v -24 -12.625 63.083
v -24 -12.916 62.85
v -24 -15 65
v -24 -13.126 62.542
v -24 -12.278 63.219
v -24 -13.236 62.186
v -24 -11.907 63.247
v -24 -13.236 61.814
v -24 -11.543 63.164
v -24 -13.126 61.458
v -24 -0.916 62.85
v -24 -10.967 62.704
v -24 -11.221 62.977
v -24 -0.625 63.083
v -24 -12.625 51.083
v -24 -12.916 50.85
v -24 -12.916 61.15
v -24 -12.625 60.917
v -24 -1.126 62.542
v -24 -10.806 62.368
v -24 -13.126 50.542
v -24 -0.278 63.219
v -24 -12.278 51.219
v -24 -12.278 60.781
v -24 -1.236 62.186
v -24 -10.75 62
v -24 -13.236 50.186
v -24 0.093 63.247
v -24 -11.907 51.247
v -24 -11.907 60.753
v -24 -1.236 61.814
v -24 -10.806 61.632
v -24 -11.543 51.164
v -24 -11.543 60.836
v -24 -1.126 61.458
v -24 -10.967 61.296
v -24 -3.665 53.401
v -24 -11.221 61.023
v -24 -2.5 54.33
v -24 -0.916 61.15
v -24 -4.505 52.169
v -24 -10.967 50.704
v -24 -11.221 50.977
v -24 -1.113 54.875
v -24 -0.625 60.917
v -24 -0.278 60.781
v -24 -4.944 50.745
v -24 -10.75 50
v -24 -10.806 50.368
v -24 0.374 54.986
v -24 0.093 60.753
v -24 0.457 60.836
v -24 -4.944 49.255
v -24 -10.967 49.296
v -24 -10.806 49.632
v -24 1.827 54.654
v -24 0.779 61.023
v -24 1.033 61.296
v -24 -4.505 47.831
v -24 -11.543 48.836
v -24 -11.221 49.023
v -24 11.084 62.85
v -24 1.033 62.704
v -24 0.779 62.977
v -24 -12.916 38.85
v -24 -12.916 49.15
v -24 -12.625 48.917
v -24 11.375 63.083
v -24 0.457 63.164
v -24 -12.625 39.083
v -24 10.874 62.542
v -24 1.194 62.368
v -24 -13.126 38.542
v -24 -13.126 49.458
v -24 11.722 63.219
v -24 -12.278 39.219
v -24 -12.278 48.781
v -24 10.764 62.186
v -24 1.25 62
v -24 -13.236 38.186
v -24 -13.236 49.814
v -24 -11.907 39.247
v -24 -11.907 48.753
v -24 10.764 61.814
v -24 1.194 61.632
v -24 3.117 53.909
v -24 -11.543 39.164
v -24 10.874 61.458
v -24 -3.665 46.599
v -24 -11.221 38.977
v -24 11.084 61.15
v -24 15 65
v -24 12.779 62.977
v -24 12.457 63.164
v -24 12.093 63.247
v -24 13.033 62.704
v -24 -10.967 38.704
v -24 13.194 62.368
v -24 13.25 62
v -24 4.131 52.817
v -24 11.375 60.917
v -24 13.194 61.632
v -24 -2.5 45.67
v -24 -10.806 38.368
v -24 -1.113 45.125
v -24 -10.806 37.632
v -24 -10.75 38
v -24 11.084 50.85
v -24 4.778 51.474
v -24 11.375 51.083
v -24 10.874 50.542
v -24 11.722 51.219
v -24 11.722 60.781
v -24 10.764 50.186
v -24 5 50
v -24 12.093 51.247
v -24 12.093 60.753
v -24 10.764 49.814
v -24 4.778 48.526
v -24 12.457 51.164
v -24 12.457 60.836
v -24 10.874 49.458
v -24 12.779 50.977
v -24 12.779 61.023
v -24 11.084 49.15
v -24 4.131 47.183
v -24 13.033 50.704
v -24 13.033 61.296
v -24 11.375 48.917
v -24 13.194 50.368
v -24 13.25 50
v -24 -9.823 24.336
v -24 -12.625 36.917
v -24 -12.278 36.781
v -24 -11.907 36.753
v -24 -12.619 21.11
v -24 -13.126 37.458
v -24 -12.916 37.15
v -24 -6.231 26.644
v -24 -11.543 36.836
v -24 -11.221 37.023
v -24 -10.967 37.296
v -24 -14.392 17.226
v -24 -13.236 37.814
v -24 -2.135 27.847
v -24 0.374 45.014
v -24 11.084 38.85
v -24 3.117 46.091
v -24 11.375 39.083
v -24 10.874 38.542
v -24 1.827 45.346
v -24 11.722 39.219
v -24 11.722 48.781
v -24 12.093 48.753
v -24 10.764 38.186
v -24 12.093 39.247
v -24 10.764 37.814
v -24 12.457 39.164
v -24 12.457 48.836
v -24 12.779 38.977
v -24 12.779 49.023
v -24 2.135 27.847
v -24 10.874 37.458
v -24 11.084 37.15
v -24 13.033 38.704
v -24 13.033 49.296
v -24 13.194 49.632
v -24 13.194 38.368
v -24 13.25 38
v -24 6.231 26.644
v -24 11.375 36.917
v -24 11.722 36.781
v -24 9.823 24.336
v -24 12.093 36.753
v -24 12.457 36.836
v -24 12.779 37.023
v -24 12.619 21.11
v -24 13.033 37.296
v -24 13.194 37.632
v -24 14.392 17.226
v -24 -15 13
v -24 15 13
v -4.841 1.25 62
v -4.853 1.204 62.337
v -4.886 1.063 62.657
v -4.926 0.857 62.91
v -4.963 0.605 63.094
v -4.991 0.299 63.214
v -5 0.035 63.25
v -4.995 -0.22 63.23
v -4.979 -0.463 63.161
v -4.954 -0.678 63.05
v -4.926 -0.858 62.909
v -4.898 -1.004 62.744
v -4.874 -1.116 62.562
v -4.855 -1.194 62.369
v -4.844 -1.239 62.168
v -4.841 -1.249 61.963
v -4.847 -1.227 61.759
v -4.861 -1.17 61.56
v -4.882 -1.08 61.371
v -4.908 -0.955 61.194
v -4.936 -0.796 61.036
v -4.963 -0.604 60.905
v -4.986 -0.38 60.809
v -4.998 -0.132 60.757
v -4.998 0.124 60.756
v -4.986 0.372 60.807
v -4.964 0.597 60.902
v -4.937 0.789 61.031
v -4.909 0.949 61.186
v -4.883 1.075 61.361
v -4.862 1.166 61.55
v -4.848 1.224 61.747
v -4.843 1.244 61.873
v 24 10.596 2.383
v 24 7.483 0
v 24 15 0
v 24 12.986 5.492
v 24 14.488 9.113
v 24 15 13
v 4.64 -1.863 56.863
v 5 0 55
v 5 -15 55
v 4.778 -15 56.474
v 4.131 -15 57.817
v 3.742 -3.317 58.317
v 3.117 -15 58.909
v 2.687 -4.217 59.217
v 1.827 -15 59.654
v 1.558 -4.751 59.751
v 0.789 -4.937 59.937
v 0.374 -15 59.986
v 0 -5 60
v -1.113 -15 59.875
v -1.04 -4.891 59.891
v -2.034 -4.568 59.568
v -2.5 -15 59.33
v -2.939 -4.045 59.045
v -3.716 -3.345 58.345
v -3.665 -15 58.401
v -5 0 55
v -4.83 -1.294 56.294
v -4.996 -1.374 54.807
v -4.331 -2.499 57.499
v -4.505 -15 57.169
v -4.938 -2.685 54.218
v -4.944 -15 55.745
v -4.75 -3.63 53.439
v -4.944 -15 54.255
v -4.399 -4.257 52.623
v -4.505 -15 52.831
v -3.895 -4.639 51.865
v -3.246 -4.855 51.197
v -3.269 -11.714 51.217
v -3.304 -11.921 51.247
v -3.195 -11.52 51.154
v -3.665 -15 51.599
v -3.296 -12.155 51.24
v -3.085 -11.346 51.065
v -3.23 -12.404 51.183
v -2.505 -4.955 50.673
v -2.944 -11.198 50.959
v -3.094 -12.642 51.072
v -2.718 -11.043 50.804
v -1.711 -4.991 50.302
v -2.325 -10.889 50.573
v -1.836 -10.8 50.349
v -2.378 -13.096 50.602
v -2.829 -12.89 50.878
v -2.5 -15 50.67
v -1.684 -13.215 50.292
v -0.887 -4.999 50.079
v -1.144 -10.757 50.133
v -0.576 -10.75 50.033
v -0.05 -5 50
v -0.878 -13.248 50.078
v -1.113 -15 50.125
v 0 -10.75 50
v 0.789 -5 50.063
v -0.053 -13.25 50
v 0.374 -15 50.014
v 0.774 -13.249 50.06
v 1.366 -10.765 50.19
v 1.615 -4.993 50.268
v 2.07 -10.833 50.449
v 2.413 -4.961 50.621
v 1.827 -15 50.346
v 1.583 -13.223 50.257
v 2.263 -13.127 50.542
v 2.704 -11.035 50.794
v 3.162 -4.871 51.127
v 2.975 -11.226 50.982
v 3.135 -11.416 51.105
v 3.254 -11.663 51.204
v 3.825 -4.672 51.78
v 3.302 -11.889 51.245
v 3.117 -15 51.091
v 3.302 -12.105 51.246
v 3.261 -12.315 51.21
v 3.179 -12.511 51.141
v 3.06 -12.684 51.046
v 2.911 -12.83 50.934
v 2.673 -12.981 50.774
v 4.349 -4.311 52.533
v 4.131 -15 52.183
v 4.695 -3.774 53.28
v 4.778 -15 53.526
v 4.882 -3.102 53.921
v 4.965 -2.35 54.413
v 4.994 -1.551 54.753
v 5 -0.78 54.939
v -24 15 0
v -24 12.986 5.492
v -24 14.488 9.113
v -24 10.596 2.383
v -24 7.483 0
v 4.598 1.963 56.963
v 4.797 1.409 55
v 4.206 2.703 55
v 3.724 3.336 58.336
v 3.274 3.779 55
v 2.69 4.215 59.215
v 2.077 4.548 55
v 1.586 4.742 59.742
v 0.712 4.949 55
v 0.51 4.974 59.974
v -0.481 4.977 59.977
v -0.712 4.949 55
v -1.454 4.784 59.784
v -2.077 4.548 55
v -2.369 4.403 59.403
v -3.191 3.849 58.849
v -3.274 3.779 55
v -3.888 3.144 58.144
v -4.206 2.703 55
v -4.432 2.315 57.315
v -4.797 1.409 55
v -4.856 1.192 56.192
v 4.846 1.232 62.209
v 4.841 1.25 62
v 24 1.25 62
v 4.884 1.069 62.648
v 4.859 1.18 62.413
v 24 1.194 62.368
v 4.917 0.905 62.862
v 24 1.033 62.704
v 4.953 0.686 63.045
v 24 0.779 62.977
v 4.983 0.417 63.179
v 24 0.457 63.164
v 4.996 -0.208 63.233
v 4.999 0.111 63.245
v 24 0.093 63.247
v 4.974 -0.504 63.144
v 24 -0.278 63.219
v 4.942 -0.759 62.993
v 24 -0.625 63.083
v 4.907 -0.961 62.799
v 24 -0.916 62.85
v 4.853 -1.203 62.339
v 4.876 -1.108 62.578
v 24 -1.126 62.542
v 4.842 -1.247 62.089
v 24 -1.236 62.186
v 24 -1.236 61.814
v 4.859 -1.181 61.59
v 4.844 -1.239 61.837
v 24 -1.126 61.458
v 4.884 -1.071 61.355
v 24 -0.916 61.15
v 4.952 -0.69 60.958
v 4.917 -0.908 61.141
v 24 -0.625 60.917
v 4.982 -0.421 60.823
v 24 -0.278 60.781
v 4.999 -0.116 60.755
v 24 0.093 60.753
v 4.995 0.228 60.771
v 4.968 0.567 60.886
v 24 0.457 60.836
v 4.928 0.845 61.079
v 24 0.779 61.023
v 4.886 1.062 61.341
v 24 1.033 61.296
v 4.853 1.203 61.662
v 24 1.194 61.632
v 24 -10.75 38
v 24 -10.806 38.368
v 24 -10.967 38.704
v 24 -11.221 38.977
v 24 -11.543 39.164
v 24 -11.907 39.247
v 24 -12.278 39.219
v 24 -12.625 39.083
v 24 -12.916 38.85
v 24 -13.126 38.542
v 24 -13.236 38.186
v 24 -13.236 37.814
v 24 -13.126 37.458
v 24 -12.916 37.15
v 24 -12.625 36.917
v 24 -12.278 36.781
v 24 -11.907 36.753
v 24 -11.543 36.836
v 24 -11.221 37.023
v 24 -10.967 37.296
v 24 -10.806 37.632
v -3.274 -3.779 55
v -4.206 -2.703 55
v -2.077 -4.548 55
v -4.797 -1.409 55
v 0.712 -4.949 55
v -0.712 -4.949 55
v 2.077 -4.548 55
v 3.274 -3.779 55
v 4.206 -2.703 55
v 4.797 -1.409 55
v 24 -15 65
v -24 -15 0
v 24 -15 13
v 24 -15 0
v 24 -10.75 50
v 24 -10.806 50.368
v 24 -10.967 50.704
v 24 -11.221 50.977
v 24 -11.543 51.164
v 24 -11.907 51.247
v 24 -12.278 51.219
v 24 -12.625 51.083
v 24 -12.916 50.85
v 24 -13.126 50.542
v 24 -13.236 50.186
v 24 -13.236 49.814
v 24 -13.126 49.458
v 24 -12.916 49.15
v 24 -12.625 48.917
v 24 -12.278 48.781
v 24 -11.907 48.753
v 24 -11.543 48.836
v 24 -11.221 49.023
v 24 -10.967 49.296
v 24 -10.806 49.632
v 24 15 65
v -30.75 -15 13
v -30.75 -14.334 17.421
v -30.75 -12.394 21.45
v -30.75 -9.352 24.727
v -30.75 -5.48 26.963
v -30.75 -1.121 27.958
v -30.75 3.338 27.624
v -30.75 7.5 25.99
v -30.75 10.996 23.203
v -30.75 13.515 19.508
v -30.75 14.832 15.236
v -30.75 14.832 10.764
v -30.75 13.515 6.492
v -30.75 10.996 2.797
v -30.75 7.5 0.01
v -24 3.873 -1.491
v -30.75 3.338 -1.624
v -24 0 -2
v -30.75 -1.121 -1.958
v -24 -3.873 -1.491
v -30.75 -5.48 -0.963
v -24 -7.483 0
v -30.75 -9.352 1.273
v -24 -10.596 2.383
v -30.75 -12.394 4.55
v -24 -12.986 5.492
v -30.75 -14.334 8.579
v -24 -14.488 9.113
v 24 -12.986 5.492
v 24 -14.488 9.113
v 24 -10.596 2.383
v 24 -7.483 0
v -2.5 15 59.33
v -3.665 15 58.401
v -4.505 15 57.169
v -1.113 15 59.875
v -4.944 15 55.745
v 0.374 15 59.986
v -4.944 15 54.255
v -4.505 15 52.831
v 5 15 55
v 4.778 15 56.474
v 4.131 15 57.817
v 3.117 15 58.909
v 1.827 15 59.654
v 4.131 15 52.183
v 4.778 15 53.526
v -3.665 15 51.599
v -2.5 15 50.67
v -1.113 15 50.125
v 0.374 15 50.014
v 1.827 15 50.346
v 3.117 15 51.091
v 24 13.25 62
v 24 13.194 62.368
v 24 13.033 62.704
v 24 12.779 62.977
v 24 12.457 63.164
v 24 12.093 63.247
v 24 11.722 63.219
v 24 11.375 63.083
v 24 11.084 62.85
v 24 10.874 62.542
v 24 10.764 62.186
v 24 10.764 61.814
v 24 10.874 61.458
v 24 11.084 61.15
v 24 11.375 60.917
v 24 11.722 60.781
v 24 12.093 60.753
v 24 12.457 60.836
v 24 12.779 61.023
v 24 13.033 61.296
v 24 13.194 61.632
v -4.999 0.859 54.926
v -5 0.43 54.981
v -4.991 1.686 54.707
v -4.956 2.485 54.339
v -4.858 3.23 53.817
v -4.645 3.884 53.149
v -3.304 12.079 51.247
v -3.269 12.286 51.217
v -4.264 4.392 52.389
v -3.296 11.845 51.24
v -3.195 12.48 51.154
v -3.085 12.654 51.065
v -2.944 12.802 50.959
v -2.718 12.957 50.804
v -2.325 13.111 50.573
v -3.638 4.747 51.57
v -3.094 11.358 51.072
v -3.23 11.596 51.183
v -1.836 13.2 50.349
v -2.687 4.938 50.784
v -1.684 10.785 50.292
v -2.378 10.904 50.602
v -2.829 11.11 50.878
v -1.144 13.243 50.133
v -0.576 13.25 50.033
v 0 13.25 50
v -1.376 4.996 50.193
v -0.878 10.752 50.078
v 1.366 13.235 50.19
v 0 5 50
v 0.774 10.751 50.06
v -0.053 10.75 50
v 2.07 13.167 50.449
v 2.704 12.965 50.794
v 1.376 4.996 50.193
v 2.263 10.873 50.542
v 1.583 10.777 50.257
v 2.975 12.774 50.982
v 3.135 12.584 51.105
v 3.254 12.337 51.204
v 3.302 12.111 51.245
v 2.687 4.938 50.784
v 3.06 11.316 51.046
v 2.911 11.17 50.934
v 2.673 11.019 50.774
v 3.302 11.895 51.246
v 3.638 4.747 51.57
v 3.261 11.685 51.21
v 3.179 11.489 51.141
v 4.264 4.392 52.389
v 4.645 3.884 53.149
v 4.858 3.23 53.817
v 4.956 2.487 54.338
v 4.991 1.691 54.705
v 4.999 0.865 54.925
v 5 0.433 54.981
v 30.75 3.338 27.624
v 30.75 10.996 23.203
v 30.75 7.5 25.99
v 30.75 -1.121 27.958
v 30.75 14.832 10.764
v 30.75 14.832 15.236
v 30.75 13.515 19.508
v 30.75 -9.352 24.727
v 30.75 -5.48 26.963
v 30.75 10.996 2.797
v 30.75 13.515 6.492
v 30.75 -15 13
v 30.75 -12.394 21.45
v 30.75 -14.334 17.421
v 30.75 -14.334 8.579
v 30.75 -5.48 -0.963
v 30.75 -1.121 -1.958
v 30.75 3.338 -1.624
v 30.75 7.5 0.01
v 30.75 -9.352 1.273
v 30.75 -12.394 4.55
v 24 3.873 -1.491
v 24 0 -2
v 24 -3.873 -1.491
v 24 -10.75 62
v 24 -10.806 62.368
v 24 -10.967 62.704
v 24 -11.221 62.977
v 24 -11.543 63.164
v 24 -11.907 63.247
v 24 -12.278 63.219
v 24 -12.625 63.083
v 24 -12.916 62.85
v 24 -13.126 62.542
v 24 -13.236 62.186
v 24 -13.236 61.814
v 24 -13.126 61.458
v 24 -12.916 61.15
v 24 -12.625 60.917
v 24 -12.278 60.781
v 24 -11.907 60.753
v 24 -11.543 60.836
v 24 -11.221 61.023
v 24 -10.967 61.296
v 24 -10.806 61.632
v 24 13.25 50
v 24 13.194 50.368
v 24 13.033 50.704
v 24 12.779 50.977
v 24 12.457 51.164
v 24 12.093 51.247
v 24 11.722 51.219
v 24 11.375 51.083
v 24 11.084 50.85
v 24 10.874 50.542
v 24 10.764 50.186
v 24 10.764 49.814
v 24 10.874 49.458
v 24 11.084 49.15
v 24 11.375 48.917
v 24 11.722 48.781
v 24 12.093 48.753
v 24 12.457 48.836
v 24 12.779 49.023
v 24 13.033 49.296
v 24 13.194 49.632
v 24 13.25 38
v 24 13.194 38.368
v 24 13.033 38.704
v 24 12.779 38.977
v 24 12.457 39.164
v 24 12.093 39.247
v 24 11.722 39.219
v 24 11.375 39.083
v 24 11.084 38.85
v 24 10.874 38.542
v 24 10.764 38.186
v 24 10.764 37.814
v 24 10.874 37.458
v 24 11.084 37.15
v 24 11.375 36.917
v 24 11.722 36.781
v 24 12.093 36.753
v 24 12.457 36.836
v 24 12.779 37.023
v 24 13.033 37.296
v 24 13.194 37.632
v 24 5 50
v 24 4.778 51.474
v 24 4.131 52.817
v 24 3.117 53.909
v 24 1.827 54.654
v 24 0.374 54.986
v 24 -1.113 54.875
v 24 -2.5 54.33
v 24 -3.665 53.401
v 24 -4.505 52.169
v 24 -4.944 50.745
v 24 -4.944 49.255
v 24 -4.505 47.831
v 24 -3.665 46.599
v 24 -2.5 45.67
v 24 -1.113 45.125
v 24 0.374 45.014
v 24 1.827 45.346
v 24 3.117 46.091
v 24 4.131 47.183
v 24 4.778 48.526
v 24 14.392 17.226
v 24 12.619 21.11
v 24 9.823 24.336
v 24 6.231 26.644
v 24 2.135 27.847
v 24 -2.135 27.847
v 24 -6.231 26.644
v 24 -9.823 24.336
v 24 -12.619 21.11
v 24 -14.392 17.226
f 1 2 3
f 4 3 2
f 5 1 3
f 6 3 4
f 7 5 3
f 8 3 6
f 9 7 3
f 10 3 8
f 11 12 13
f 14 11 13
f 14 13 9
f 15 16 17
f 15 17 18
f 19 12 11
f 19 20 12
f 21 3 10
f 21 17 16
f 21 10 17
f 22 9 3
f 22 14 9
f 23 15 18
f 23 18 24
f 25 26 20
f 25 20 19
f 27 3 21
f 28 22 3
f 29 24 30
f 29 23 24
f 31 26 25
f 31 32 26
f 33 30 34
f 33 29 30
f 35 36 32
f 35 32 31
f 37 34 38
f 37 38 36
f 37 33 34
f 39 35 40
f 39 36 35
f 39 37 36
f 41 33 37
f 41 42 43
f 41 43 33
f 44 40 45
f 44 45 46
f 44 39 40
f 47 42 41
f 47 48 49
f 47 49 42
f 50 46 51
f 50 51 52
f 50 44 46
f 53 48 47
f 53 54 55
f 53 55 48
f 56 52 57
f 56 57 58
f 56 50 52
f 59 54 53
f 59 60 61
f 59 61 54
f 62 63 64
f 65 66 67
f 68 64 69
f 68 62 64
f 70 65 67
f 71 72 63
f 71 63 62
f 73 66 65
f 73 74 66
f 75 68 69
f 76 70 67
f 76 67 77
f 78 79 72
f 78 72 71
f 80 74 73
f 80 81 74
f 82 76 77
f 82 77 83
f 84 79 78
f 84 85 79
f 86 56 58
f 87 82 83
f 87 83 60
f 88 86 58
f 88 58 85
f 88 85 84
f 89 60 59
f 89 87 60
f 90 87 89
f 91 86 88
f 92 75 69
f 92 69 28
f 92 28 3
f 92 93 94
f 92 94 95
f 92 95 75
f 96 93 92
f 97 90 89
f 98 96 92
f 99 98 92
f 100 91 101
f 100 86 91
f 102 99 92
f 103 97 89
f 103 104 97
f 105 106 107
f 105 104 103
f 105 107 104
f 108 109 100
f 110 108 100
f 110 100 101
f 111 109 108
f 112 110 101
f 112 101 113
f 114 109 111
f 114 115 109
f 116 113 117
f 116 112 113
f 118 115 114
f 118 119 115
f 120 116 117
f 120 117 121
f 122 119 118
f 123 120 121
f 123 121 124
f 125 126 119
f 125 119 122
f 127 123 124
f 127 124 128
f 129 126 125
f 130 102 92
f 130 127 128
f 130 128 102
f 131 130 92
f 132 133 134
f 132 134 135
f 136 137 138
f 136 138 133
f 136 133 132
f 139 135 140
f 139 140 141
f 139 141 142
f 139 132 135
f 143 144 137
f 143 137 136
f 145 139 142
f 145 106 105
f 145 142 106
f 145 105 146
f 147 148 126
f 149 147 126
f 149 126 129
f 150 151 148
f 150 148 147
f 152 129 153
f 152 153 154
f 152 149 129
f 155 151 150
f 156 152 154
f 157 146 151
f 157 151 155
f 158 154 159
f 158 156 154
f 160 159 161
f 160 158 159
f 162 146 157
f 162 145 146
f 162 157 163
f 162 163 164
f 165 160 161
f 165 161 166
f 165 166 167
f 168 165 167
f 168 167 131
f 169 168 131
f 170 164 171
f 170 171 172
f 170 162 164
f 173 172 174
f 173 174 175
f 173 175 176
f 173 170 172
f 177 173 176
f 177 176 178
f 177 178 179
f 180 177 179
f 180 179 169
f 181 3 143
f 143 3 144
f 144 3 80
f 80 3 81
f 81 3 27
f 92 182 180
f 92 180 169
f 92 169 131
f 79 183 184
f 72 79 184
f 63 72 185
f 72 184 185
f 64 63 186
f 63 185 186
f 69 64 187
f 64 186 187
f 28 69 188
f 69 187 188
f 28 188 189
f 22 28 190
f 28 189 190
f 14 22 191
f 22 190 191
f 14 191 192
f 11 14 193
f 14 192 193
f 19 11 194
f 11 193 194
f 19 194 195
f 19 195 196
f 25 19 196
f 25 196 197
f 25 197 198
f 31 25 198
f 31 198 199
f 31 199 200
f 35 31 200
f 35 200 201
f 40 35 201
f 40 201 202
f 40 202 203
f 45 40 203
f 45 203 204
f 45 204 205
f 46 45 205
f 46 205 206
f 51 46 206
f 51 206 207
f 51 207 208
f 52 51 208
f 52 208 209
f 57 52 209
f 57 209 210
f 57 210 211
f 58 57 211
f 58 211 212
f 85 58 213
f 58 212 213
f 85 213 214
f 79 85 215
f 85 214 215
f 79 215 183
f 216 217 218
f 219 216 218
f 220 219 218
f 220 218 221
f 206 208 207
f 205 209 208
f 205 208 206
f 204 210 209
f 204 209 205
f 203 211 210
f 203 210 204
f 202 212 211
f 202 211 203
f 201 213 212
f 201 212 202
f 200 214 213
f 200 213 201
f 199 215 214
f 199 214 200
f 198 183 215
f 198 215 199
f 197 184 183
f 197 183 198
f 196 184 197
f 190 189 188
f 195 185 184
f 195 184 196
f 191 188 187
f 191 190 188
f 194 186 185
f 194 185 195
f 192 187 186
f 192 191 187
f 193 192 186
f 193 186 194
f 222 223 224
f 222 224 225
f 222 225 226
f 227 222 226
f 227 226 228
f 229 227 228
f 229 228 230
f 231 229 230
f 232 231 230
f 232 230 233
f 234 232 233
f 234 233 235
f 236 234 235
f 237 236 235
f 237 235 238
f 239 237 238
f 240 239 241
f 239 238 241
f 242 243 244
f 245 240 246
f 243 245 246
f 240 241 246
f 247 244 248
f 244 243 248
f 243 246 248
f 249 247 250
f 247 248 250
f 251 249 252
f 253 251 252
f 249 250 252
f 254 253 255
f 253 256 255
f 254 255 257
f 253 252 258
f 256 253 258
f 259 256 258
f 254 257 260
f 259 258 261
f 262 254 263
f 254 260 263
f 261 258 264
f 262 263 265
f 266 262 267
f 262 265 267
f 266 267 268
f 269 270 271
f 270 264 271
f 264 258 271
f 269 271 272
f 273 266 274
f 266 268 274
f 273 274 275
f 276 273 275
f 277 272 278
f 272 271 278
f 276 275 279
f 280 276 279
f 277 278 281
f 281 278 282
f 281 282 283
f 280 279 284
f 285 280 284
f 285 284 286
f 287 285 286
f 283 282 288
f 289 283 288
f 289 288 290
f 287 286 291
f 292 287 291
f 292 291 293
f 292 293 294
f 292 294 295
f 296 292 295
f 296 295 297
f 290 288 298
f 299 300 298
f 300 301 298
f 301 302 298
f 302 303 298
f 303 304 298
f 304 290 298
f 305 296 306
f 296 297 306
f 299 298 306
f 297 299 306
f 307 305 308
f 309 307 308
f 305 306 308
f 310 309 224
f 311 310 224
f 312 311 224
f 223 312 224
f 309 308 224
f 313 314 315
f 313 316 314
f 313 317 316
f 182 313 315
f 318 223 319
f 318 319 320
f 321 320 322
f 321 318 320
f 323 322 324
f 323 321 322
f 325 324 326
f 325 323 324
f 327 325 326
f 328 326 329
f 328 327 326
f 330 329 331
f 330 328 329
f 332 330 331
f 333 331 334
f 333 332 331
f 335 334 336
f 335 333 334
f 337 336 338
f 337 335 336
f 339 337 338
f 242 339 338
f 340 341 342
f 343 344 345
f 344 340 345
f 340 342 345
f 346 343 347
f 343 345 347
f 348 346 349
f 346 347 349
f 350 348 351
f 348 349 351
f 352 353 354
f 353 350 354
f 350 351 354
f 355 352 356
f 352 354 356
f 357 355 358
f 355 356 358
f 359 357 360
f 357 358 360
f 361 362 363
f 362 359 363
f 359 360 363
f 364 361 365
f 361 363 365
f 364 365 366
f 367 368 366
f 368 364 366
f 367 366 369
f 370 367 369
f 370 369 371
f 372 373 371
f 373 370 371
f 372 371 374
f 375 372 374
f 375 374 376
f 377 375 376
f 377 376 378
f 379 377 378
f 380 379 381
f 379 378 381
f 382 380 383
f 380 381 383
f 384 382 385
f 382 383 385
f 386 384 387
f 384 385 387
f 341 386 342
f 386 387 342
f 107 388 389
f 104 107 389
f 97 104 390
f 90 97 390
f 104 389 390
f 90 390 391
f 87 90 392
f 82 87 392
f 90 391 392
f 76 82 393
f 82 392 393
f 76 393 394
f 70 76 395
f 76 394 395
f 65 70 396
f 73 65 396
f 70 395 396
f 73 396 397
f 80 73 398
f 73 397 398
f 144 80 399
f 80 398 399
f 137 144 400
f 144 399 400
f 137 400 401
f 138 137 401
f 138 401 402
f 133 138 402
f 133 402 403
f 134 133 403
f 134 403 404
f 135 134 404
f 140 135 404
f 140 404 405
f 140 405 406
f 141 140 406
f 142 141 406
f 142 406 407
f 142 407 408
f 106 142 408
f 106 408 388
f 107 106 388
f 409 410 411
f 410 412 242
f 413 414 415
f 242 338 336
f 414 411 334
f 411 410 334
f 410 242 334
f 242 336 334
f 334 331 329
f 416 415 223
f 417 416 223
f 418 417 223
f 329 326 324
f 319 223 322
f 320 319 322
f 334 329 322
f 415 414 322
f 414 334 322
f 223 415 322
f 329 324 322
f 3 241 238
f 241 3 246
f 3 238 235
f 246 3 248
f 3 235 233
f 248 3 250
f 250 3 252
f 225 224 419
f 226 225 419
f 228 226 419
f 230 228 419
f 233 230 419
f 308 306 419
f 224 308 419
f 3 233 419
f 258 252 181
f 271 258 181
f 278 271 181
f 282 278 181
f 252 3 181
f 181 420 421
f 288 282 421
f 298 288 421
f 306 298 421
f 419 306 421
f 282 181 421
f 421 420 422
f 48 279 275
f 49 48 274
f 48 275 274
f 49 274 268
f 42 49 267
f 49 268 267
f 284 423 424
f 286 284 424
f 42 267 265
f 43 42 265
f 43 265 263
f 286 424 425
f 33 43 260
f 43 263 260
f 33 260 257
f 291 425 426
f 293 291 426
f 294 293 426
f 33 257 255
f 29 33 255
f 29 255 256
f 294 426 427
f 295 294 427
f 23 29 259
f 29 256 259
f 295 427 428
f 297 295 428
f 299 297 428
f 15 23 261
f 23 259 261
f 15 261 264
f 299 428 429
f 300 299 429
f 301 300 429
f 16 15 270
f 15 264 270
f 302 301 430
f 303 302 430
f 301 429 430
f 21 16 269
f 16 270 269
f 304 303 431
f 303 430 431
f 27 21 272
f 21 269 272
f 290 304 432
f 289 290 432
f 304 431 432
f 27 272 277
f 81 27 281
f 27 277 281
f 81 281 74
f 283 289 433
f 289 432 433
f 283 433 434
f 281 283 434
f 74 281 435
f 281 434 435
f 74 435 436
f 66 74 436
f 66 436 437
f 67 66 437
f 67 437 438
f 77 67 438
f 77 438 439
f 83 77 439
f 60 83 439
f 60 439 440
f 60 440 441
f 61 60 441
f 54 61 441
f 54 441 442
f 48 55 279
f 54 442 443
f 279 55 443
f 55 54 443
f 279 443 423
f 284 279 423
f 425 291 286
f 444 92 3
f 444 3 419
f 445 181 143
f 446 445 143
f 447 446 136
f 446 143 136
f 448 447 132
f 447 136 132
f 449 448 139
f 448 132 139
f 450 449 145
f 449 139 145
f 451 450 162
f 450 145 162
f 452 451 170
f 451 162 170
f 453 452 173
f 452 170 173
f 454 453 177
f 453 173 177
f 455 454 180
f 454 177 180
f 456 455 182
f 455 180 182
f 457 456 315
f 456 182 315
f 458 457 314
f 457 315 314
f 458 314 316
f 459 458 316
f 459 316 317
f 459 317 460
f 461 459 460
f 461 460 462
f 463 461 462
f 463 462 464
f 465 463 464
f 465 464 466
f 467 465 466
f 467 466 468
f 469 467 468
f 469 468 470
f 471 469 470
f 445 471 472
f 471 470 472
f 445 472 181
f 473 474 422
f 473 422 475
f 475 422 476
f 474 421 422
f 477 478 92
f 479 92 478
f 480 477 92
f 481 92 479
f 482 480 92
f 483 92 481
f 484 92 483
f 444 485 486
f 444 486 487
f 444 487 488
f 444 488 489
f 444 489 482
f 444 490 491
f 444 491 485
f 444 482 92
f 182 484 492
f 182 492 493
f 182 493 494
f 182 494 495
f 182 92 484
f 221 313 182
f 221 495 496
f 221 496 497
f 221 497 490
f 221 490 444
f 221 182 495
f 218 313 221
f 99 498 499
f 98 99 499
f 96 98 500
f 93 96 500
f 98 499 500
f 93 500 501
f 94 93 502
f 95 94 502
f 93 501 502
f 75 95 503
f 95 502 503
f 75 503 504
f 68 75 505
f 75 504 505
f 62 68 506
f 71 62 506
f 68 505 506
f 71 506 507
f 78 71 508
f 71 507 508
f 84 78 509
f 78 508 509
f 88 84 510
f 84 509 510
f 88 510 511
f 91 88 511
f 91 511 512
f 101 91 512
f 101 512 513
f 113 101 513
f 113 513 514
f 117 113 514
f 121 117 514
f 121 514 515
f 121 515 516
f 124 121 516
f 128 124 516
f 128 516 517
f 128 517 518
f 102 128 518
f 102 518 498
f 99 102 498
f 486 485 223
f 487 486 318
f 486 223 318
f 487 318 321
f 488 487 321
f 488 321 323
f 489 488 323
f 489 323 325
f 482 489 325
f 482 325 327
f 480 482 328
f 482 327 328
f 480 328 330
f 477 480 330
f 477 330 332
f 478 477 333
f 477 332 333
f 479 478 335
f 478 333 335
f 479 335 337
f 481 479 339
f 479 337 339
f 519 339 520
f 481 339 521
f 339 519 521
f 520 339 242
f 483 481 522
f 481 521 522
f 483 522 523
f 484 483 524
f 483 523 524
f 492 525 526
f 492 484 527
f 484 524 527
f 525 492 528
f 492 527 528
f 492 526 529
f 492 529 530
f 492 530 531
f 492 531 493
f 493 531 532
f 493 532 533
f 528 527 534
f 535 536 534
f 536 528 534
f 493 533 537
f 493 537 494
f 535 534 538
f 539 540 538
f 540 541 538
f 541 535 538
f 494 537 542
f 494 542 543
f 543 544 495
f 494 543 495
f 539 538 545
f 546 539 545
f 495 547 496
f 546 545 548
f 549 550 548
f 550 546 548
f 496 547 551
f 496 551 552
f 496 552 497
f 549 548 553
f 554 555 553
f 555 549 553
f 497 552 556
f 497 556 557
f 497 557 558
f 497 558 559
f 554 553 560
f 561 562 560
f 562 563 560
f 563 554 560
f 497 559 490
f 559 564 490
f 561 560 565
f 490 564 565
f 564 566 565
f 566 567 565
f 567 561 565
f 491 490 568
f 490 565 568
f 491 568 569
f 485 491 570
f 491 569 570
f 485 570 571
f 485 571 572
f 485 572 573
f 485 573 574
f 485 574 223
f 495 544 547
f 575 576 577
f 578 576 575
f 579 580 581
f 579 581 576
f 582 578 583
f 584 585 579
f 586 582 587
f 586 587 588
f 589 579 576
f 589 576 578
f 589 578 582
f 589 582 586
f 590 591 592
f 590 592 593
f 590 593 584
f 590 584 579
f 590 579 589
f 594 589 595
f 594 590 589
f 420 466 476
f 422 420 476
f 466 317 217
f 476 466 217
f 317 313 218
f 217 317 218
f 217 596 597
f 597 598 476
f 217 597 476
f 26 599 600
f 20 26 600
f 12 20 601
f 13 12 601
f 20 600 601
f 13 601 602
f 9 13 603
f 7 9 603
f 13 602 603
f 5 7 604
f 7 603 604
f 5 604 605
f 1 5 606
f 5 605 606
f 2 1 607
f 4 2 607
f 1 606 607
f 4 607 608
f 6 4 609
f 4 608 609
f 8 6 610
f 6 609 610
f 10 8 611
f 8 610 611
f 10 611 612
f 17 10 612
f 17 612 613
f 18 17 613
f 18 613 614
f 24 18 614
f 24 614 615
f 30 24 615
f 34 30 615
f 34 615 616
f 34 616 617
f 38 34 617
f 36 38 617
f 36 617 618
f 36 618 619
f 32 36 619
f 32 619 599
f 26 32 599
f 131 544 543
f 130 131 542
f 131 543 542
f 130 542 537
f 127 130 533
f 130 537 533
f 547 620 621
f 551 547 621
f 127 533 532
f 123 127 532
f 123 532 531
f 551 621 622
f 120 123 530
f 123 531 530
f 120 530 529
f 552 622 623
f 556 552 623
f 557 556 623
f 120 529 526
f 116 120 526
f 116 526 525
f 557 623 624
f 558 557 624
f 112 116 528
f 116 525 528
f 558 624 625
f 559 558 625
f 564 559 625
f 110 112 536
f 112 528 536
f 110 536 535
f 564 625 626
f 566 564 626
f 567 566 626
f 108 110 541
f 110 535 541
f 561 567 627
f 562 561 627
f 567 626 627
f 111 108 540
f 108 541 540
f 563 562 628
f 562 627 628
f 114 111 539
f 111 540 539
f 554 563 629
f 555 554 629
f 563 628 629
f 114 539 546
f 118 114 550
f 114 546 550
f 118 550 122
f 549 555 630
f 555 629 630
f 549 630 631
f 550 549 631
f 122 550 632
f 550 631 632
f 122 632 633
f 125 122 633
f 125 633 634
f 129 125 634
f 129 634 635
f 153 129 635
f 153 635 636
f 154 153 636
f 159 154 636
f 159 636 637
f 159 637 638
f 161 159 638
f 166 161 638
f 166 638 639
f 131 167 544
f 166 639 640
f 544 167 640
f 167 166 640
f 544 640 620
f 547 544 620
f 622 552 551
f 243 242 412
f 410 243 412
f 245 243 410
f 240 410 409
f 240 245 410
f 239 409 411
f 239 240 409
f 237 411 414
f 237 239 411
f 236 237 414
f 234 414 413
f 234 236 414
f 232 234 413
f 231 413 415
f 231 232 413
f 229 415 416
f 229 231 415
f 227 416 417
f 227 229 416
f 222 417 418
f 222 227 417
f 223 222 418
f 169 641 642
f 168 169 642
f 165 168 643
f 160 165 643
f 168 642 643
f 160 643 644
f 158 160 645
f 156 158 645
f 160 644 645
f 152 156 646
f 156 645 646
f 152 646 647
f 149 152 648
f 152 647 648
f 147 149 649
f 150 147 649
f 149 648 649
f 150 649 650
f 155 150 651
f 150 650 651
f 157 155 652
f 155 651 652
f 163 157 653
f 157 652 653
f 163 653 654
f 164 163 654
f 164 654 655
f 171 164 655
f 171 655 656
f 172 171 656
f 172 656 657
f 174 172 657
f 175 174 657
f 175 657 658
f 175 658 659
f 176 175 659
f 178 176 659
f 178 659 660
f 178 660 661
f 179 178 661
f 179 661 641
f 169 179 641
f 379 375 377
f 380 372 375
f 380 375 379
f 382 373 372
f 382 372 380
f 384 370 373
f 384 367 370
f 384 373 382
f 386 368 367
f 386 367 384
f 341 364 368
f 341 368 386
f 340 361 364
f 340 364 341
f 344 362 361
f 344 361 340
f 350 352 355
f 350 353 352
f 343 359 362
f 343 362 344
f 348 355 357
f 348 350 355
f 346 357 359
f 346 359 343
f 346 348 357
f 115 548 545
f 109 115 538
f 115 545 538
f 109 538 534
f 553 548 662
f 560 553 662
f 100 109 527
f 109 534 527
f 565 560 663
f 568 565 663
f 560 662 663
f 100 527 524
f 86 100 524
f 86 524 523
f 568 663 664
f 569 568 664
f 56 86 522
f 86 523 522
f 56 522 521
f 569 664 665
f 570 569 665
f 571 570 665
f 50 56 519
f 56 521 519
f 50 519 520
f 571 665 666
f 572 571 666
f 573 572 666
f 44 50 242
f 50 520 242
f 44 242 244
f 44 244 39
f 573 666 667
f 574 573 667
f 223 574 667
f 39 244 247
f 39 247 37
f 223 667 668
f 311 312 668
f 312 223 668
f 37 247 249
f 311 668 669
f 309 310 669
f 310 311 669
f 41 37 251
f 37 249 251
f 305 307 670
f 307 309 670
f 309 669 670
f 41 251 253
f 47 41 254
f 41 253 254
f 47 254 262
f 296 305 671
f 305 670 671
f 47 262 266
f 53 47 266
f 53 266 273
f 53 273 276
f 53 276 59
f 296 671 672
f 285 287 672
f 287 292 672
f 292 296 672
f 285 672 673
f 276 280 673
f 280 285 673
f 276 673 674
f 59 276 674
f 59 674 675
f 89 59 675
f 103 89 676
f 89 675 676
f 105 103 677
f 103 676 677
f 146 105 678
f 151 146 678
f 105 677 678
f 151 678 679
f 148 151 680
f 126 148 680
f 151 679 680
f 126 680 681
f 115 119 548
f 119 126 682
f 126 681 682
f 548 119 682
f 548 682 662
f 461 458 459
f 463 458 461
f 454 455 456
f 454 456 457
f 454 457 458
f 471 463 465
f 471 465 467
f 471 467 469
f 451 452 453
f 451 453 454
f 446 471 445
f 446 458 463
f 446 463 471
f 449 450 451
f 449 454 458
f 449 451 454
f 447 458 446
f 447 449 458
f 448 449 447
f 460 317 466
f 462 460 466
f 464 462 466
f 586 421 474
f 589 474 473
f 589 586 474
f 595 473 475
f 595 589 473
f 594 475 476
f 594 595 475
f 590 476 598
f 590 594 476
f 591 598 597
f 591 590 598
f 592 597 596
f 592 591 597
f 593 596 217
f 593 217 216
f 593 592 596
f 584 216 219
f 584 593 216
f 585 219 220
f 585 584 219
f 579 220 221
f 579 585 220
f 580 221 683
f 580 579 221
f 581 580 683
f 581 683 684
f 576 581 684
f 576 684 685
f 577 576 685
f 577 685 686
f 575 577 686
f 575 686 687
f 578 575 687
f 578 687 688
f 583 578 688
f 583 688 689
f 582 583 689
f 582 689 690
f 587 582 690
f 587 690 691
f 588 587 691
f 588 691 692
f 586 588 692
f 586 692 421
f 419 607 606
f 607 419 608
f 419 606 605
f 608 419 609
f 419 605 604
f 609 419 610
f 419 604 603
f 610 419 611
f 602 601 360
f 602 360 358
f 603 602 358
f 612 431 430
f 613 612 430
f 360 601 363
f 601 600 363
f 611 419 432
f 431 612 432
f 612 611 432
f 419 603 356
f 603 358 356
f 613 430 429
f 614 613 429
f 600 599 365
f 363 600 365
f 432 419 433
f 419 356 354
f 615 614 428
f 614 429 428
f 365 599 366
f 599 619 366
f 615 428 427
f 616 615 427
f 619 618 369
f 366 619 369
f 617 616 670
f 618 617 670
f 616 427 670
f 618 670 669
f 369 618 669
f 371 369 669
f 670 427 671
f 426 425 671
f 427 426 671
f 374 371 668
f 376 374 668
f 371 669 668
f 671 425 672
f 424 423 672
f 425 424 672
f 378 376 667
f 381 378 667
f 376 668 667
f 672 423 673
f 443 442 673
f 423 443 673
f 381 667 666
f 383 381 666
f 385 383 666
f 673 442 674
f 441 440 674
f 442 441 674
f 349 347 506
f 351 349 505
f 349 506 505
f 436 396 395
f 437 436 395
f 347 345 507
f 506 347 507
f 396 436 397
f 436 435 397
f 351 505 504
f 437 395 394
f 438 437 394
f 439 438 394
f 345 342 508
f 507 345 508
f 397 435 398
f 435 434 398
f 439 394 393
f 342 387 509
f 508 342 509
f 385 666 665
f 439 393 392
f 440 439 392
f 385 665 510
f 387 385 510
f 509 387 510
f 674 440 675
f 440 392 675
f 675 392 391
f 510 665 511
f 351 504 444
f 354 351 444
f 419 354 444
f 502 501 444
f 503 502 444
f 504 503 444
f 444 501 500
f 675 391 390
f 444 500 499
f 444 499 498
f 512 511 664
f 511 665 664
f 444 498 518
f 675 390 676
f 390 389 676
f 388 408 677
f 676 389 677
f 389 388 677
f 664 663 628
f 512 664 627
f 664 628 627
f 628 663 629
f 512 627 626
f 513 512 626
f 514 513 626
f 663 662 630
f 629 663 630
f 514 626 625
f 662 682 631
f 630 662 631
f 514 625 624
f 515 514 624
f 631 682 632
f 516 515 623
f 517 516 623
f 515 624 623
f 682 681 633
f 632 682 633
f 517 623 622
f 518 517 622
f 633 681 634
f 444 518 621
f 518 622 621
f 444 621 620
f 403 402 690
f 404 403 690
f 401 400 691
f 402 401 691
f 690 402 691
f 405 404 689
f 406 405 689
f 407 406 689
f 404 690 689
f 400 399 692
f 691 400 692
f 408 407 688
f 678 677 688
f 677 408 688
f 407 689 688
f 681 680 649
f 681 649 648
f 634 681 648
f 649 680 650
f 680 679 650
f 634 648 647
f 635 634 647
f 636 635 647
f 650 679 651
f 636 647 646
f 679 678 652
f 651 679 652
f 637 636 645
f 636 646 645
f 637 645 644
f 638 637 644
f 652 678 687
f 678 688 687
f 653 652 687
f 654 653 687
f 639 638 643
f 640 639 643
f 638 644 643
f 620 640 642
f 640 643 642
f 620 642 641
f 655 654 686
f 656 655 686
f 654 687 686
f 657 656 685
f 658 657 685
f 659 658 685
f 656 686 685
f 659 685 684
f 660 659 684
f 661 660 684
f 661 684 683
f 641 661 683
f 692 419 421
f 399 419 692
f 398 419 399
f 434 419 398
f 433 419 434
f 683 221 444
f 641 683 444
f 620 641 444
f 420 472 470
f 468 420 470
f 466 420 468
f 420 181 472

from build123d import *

# Parameters (mm, degrees)
SKETCH_1_W          = 48
SKETCH_1_H          = 30
EXTRUDE_1_DEPTH     = 65
SKETCH_2_R          = 15
EXTRUDE_2_DEPTH     = 6.75
EXTRUDE_START       = 6.75
SKETCH_3_R          = 15
EXTRUDE_3_DEPTH     = 6.75
SKETCH_4_R          = 1.25
SKETCH_4_R_2        = 5
CUT_EXTRUDE_1_DEPTH = 87.299261295
SKETCH_5_R          = 5
CUT_EXTRUDE_2_DEPTH = 33
SKETCH_6_R          = 5
EXTRUDE_4_DEPTH     = 10


with BuildPart() as part:
    # 草图1 → 凸台-拉伸1 (new body)
    with BuildSketch(Plane.XY):
        Rectangle(SKETCH_1_W, SKETCH_1_H)
    extrude(amount=EXTRUDE_1_DEPTH)

    # 草图2 → 凸台-拉伸2 (add)
    with BuildSketch(Plane.ZY.offset(24)):
        with Locations(Location((13, 0, 0), (0, 0, 270))):
            Circle(SKETCH_2_R)
    extrude(amount=EXTRUDE_2_DEPTH)

    # 草图3 → 凸台-拉伸3 (add)
    with BuildSketch(Plane(origin=(24, 0, 0), x_dir=(0, 0, -1), z_dir=(1, 0, 0)).offset(EXTRUDE_START)):
        with Locations(Location((-13, 0, 0), (0, 0, 270))):
            Circle(SKETCH_3_R)
    extrude(amount=-EXTRUDE_3_DEPTH)

    # 草图4 → 切除-拉伸1 (cut, through all)
    with BuildSketch(Plane(origin=(24, 0, 0), x_dir=(0, 0, -1), z_dir=(1, 0, 0))):
        with Locations(Location((-62, 12, 0), (0, 0, 90))):
            Circle(SKETCH_4_R)
        with Locations(Location((-38, 12, 0), (0, 0, 90))):
            Circle(SKETCH_4_R)
        with Locations(Location((-38, -12, 0), (0, 0, 90))):
            Circle(SKETCH_4_R)
        with Locations(Location((-62, -12, 0), (0, 0, 90))):
            Circle(SKETCH_4_R)
        with Locations(Location((-50, 12, 0), (0, 0, 90))):
            Circle(SKETCH_4_R)
        with Locations(Location((-50, -12, 0), (0, 0, 90))):
            Circle(SKETCH_4_R)
        with Locations(Location((-62, 0, 0), (0, 0, 90))):
            Circle(SKETCH_4_R)
        with Locations(Location((-50, 0, 0), (0, 0, 90))):
            Circle(SKETCH_4_R_2)
    extrude(amount=-CUT_EXTRUDE_1_DEPTH, mode=Mode.SUBTRACT)

    # 草图5 → 切除-拉伸2 (cut)
    with BuildSketch(Plane.XZ.offset(15)):
        with Locations((0, 55)):
            Circle(SKETCH_5_R)
    extrude(amount=-CUT_EXTRUDE_2_DEPTH, mode=Mode.SUBTRACT)

    # 草图6 → 凸台-拉伸4 (add)
    with BuildSketch(Plane.XY.offset(65)):
        Circle(SKETCH_6_R)
    extrude(amount=-EXTRUDE_4_DEPTH)


solid = part.part
